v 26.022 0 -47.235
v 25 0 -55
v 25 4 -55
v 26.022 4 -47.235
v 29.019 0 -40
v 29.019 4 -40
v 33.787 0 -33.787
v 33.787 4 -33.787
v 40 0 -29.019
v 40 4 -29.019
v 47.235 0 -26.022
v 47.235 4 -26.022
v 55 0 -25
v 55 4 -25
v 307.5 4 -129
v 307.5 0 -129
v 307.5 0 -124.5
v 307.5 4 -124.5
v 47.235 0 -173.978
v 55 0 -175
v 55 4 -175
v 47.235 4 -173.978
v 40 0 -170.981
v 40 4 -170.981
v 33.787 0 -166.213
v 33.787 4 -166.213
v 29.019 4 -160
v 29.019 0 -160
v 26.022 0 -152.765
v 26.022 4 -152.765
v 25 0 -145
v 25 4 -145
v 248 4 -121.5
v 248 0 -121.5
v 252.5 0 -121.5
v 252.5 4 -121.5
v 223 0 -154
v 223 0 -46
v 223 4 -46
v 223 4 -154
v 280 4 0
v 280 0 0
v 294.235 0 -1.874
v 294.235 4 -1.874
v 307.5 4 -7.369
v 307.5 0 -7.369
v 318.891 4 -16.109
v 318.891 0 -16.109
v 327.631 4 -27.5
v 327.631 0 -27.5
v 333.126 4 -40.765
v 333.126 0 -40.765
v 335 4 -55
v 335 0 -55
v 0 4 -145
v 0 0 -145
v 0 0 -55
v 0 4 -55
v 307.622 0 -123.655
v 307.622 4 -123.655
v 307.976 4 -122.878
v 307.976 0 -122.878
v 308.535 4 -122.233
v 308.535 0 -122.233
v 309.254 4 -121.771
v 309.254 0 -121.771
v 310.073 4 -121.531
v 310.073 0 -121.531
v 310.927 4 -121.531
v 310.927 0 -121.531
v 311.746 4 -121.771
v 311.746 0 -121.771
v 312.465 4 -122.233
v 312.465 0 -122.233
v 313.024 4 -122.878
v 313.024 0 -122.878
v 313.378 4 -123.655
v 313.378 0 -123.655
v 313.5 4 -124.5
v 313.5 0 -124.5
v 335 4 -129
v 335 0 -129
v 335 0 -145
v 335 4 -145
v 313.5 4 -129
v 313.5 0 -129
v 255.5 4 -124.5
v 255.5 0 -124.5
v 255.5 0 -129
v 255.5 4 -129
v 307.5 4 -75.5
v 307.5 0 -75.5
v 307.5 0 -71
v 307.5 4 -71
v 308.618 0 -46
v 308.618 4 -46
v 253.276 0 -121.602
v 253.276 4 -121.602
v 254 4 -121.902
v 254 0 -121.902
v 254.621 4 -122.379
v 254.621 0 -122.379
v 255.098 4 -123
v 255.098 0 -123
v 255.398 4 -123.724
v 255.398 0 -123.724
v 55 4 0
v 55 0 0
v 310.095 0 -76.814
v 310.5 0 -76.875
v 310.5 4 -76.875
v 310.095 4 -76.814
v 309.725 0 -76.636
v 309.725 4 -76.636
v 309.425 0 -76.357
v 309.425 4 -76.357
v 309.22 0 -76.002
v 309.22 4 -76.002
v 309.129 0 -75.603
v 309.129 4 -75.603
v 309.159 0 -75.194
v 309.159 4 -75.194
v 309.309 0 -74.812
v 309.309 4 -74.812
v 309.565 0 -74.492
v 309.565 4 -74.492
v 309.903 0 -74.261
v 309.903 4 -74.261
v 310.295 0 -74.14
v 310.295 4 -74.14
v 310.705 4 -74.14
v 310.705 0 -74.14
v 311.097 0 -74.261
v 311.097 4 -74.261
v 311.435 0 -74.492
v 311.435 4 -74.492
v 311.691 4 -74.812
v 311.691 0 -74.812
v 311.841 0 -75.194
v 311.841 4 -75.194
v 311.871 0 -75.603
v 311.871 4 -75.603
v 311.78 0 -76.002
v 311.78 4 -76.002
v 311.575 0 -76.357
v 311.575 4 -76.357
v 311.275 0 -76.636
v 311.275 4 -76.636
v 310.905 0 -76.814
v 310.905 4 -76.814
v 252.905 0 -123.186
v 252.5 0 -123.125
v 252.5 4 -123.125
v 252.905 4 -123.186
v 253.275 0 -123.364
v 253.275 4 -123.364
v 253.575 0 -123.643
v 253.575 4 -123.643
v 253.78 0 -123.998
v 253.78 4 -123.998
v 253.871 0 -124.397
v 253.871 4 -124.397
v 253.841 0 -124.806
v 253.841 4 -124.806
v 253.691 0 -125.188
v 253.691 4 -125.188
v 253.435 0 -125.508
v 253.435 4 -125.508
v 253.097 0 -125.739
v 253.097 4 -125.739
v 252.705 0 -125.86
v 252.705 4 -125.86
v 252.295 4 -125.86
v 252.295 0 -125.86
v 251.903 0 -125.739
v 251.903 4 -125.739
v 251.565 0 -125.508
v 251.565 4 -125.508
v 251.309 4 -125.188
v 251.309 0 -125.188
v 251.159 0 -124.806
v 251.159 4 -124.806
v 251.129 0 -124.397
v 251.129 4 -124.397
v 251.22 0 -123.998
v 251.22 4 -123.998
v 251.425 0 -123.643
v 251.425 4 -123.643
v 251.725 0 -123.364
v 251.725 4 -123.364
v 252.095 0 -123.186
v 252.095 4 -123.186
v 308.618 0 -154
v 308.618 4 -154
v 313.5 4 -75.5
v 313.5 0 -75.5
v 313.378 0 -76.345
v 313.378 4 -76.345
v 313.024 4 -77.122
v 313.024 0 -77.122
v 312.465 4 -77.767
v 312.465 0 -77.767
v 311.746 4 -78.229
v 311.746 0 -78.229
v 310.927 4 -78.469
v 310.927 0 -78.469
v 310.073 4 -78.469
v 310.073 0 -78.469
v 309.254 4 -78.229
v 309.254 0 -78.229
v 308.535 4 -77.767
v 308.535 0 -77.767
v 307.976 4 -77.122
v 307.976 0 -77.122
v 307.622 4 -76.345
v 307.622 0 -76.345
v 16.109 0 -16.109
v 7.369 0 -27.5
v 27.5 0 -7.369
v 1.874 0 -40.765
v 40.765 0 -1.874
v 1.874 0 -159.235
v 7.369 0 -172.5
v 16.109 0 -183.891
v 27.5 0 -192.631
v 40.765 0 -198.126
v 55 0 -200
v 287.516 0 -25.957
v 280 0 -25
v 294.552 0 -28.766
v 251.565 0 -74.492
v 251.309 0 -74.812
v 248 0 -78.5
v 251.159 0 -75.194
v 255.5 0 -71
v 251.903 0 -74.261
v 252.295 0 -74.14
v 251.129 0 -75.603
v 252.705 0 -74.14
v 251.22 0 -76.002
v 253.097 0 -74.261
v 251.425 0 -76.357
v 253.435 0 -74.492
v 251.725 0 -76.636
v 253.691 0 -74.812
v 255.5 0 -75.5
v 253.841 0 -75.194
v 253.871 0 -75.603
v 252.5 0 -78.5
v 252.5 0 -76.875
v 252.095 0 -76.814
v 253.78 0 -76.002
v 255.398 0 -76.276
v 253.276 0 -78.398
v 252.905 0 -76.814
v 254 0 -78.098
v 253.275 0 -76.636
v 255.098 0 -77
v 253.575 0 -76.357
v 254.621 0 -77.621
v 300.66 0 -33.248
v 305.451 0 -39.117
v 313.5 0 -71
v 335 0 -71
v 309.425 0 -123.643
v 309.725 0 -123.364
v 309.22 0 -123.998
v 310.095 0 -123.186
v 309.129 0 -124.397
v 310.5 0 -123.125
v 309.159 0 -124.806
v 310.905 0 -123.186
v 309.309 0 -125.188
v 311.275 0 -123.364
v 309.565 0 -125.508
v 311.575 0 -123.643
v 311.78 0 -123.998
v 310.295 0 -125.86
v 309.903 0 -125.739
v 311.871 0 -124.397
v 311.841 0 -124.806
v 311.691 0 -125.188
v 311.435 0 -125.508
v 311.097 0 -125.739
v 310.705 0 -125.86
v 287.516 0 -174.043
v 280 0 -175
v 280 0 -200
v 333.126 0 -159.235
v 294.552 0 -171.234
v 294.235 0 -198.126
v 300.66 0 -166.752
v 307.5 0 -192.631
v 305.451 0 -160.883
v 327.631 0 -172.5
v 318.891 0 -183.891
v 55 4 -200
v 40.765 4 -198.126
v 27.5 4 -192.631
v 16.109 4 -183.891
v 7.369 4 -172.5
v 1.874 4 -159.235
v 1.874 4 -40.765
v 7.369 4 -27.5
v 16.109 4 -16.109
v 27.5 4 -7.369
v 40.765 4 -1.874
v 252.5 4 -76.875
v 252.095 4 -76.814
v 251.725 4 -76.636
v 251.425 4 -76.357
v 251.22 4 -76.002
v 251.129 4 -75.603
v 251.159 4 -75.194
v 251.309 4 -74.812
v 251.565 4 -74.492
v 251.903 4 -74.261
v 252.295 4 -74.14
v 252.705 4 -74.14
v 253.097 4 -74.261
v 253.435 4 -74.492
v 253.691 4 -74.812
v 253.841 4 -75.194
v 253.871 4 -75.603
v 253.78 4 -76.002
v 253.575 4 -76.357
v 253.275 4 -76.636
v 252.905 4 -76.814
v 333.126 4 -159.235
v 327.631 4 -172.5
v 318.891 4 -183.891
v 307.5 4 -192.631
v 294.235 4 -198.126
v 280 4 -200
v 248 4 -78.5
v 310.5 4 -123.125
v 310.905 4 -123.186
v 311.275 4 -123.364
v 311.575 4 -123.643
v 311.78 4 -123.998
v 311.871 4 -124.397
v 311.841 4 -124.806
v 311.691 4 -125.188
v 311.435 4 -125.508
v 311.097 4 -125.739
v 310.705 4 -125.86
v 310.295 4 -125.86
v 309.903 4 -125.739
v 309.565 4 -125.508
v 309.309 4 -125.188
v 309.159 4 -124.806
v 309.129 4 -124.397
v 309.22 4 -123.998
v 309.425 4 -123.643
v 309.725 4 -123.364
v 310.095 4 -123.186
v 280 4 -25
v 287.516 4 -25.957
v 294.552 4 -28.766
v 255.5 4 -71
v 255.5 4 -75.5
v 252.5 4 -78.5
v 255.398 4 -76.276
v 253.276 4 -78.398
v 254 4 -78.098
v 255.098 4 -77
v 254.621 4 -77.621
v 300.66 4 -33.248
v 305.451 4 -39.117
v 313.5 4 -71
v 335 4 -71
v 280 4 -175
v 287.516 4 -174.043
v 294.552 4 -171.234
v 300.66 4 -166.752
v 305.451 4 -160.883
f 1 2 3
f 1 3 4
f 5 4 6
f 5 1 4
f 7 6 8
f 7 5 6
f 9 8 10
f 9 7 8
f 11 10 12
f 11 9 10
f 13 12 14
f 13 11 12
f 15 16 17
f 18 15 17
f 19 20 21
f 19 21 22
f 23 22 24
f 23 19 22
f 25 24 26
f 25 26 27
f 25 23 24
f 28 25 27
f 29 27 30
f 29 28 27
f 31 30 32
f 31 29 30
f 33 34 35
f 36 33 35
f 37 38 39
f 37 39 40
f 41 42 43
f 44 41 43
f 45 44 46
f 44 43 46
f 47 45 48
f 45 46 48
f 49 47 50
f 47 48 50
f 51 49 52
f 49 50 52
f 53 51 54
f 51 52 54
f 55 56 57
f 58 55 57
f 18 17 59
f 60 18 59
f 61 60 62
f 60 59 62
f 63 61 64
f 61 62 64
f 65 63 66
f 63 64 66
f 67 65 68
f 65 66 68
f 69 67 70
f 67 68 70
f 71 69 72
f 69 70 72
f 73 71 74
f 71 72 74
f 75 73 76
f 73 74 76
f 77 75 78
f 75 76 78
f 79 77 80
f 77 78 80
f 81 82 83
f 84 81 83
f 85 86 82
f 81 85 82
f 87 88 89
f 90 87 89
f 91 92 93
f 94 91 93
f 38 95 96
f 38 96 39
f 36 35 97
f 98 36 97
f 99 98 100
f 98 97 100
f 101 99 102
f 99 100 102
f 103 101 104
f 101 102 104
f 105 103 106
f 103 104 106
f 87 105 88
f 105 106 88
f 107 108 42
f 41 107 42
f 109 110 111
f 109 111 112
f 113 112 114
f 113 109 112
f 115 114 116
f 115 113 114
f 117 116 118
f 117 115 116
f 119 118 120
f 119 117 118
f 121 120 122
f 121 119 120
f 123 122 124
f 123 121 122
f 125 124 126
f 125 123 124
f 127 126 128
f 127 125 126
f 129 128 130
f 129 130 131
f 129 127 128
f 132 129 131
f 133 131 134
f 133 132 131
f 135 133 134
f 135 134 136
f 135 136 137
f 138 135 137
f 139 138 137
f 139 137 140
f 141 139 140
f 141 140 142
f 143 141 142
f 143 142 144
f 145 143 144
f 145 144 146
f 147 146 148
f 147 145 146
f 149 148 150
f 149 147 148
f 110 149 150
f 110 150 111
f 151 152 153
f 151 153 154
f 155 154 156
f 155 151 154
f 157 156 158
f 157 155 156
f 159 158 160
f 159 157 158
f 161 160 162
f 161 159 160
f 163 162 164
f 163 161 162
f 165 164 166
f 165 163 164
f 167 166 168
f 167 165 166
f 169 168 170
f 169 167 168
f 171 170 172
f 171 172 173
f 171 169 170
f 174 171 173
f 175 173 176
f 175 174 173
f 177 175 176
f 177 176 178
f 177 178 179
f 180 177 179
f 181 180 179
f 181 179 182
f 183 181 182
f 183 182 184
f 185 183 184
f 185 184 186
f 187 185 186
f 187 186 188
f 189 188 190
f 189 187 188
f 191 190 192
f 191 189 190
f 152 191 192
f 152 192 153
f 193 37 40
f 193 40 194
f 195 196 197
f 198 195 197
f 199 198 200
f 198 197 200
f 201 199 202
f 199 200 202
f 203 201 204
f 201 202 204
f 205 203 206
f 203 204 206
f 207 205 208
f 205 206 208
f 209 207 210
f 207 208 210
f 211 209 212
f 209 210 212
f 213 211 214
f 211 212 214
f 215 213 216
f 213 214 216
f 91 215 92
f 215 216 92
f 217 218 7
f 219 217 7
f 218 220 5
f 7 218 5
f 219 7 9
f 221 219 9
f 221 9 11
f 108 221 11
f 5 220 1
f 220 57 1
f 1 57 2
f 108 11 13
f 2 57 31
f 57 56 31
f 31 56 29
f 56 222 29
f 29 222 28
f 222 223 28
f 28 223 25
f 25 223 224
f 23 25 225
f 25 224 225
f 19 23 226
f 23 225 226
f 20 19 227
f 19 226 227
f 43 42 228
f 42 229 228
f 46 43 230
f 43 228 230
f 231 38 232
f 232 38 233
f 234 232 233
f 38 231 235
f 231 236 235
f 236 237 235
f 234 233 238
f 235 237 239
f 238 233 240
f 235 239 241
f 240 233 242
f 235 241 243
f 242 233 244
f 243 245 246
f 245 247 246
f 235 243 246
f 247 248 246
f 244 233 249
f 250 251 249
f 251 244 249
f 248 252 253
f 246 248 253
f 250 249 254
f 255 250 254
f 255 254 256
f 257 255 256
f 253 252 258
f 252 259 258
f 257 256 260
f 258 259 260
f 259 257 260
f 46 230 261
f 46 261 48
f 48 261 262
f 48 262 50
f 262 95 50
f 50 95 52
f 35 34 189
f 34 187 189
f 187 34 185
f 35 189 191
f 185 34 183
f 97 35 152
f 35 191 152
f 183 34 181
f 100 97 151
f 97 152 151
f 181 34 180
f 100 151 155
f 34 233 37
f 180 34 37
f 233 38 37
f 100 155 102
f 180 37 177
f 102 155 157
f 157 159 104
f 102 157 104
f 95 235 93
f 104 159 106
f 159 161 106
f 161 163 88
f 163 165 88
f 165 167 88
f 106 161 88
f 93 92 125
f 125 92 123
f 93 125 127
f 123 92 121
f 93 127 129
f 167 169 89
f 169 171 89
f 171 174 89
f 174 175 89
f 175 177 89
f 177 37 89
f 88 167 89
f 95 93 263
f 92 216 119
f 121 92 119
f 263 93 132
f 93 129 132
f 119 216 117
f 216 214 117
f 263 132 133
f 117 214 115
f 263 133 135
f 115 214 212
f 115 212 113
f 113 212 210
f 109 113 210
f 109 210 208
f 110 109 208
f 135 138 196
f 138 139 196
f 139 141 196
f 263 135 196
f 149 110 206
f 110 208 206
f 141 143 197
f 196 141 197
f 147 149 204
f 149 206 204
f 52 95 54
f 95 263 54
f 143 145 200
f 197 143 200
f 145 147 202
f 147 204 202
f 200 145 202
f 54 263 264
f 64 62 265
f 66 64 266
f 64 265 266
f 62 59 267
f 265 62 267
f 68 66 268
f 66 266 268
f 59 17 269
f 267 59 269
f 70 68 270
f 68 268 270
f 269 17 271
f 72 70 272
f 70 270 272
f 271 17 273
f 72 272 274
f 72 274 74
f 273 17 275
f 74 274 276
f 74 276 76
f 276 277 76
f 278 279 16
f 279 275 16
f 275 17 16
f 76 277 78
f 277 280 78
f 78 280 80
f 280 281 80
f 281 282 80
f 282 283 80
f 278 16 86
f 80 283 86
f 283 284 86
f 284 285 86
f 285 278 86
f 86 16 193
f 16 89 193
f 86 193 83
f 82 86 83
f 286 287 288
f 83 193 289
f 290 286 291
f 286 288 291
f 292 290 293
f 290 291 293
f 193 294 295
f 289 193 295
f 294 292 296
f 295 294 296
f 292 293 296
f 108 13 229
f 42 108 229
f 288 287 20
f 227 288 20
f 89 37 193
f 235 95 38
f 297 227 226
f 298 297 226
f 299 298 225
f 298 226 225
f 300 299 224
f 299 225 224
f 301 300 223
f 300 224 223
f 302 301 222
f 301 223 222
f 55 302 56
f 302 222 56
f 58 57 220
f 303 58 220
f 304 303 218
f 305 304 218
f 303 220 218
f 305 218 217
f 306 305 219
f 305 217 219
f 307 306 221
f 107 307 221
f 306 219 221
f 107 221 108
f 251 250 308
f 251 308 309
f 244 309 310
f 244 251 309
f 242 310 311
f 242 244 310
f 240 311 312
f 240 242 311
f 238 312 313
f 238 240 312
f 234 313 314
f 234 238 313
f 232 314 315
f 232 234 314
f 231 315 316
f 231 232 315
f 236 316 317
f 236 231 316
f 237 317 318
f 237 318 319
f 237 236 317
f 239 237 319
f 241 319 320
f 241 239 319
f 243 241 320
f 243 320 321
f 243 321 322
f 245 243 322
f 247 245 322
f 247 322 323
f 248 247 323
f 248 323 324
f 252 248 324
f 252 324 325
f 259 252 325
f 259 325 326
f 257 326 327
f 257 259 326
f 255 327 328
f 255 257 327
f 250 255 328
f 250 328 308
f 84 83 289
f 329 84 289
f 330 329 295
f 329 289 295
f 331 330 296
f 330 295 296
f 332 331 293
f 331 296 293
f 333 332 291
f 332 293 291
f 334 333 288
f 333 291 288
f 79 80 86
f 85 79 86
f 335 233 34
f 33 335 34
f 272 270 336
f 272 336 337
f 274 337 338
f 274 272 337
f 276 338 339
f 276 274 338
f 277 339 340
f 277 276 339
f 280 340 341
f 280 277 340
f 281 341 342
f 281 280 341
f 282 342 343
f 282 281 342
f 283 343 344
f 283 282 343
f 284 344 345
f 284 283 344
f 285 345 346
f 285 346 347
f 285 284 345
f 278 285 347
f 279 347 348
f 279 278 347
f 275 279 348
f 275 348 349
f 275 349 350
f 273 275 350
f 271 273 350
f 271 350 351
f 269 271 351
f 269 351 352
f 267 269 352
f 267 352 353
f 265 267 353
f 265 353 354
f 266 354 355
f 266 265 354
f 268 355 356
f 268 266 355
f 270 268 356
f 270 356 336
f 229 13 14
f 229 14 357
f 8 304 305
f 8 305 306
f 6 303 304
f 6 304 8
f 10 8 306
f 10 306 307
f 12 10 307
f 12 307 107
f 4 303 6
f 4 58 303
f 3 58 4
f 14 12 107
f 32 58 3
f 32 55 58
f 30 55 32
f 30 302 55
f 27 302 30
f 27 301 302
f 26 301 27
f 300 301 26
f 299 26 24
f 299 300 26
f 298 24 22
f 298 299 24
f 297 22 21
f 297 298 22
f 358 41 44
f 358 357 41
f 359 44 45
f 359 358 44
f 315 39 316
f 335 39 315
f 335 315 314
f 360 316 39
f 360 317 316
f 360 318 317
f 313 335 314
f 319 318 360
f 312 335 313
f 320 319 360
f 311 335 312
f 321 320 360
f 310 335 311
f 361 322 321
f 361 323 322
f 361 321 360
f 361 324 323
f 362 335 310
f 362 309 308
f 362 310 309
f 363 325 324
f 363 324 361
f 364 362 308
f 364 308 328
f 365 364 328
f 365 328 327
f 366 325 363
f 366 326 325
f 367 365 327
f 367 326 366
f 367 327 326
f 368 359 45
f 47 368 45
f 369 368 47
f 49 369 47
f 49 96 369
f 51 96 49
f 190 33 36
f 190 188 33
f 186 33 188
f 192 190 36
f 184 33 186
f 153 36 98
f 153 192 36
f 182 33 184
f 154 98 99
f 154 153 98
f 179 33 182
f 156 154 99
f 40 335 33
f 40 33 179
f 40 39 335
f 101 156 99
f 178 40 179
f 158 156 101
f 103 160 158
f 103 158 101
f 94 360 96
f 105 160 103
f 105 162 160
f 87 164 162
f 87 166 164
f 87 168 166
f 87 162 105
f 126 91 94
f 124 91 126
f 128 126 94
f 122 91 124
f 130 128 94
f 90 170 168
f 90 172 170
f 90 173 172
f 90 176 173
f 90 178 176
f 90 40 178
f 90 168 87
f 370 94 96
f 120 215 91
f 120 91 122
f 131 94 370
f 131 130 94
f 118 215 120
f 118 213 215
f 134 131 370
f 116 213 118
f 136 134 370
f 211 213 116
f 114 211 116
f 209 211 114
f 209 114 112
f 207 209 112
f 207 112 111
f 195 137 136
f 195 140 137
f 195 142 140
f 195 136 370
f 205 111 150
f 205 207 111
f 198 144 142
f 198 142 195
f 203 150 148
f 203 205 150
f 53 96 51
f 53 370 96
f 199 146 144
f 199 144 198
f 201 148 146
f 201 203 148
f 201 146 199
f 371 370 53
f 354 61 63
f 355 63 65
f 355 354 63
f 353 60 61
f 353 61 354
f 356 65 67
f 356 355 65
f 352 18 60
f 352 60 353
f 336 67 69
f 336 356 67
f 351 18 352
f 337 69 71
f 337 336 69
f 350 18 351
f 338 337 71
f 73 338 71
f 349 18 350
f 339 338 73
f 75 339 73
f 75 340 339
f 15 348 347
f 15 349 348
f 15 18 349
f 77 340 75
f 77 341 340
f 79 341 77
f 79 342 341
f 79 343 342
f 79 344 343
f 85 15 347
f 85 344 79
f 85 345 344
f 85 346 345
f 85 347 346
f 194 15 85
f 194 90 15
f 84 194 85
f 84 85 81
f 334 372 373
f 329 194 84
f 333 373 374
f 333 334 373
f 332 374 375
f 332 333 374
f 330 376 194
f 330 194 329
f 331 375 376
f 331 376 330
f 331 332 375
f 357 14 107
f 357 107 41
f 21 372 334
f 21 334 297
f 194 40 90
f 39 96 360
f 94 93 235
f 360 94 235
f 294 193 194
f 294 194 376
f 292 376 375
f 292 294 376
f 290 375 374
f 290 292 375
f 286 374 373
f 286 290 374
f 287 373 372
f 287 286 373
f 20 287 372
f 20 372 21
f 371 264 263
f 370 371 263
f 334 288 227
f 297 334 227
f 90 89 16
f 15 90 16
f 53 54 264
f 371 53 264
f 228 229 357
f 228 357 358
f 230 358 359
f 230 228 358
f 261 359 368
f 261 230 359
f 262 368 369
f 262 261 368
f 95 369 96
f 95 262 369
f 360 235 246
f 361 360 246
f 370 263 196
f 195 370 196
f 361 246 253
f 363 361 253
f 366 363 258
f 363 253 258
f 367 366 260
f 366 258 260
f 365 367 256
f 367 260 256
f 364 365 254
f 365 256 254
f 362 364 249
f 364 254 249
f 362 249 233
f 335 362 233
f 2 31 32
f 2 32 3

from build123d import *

# Parameters (mm, degrees)
SKETCH1_R           = 1.375
BOSS_EXTRUDE1_DEPTH = 4


with BuildPart() as part:
    # Sketch1 → Boss-Extrude1 (new body)
    with BuildSketch(Plane(origin=(0, 0, 0), x_dir=(1, 0, 0), z_dir=(0, 1, 0))):
        with BuildLine():
            Line((55, 0), (280, 0))
            ThreePointArc((280, 0), (318.890872965, 16.109127035), (335, 55))
            Line((335, 55), (335, 71))
            Line((335, 71), (313.5, 71))
            Line((313.5, 71), (313.5, 75.5))
            ThreePointArc((313.5, 75.5), (310.5, 78.5), (307.5, 75.5))
            Line((307.5, 75.5), (307.5, 71))
            Line((307.5, 71), (255.5, 71))
            Line((255.5, 71), (255.5, 75.5))
            ThreePointArc((255.5, 75.5), (254.621320344, 77.621320344), (252.5, 78.5))
            Line((252.5, 78.5), (248, 78.5))
            Line((248, 78.5), (248, 121.5))
            Line((248, 121.5), (252.5, 121.5))
            ThreePointArc((252.5, 121.5), (254.621320344, 122.378679656), (255.5, 124.5))
            Line((255.5, 124.5), (255.5, 129))
            Line((255.5, 129), (307.5, 129))
            Line((307.5, 129), (307.5, 124.5))
            ThreePointArc((307.5, 124.5), (310.5, 121.5), (313.5, 124.5))
            Line((313.5, 124.5), (313.5, 129))
            Line((313.5, 129), (335, 129))
            Line((335, 129), (335, 145))
            ThreePointArc((335, 145), (318.890872965, 183.890872965), (280, 200))
            Line((280, 200), (55, 200))
            ThreePointArc((55, 200), (16.109127035, 183.890872965), (0, 145))
            Line((0, 145), (0, 55))
            ThreePointArc((0, 55), (16.109127035, 16.109127035), (55, 0))
        make_face()
        with Locations(Location((252.5, 124.5, 0), (0, 0, 270))):
            Circle(SKETCH1_R, mode=Mode.SUBTRACT)
        with Locations(Location((252.5, 75.5, 0), (0, 0, 90))):
            Circle(SKETCH1_R, mode=Mode.SUBTRACT)
        with Locations(Location((310.5, 124.5, 0), (0, 0, 270))):
            Circle(SKETCH1_R, mode=Mode.SUBTRACT)
        with Locations(Location((310.5, 75.5, 0), (0, 0, 90))):
            Circle(SKETCH1_R, mode=Mode.SUBTRACT)
        with BuildLine():
            Line((55, 25), (280, 25))
            ThreePointArc((280, 25), (297.748239349, 30.813226755), (308.618176043, 46))
            Line((308.618176043, 46), (223, 46))
            Line((223, 46), (223, 154))
            Line((223, 154), (308.618176043, 154))
            ThreePointArc((308.618176043, 154), (297.748239349, 169.186773245), (280, 175))
            Line((280, 175), (55, 175))
            ThreePointArc((55, 175), (33.786796564, 166.213203436), (25, 145))
            Line((25, 145), (25, 55))
            ThreePointArc((25, 55), (33.786796564, 33.786796564), (55, 25))
        make_face(mode=Mode.SUBTRACT)
    extrude(amount=BOSS_EXTRUDE1_DEPTH)


solid = part.part
